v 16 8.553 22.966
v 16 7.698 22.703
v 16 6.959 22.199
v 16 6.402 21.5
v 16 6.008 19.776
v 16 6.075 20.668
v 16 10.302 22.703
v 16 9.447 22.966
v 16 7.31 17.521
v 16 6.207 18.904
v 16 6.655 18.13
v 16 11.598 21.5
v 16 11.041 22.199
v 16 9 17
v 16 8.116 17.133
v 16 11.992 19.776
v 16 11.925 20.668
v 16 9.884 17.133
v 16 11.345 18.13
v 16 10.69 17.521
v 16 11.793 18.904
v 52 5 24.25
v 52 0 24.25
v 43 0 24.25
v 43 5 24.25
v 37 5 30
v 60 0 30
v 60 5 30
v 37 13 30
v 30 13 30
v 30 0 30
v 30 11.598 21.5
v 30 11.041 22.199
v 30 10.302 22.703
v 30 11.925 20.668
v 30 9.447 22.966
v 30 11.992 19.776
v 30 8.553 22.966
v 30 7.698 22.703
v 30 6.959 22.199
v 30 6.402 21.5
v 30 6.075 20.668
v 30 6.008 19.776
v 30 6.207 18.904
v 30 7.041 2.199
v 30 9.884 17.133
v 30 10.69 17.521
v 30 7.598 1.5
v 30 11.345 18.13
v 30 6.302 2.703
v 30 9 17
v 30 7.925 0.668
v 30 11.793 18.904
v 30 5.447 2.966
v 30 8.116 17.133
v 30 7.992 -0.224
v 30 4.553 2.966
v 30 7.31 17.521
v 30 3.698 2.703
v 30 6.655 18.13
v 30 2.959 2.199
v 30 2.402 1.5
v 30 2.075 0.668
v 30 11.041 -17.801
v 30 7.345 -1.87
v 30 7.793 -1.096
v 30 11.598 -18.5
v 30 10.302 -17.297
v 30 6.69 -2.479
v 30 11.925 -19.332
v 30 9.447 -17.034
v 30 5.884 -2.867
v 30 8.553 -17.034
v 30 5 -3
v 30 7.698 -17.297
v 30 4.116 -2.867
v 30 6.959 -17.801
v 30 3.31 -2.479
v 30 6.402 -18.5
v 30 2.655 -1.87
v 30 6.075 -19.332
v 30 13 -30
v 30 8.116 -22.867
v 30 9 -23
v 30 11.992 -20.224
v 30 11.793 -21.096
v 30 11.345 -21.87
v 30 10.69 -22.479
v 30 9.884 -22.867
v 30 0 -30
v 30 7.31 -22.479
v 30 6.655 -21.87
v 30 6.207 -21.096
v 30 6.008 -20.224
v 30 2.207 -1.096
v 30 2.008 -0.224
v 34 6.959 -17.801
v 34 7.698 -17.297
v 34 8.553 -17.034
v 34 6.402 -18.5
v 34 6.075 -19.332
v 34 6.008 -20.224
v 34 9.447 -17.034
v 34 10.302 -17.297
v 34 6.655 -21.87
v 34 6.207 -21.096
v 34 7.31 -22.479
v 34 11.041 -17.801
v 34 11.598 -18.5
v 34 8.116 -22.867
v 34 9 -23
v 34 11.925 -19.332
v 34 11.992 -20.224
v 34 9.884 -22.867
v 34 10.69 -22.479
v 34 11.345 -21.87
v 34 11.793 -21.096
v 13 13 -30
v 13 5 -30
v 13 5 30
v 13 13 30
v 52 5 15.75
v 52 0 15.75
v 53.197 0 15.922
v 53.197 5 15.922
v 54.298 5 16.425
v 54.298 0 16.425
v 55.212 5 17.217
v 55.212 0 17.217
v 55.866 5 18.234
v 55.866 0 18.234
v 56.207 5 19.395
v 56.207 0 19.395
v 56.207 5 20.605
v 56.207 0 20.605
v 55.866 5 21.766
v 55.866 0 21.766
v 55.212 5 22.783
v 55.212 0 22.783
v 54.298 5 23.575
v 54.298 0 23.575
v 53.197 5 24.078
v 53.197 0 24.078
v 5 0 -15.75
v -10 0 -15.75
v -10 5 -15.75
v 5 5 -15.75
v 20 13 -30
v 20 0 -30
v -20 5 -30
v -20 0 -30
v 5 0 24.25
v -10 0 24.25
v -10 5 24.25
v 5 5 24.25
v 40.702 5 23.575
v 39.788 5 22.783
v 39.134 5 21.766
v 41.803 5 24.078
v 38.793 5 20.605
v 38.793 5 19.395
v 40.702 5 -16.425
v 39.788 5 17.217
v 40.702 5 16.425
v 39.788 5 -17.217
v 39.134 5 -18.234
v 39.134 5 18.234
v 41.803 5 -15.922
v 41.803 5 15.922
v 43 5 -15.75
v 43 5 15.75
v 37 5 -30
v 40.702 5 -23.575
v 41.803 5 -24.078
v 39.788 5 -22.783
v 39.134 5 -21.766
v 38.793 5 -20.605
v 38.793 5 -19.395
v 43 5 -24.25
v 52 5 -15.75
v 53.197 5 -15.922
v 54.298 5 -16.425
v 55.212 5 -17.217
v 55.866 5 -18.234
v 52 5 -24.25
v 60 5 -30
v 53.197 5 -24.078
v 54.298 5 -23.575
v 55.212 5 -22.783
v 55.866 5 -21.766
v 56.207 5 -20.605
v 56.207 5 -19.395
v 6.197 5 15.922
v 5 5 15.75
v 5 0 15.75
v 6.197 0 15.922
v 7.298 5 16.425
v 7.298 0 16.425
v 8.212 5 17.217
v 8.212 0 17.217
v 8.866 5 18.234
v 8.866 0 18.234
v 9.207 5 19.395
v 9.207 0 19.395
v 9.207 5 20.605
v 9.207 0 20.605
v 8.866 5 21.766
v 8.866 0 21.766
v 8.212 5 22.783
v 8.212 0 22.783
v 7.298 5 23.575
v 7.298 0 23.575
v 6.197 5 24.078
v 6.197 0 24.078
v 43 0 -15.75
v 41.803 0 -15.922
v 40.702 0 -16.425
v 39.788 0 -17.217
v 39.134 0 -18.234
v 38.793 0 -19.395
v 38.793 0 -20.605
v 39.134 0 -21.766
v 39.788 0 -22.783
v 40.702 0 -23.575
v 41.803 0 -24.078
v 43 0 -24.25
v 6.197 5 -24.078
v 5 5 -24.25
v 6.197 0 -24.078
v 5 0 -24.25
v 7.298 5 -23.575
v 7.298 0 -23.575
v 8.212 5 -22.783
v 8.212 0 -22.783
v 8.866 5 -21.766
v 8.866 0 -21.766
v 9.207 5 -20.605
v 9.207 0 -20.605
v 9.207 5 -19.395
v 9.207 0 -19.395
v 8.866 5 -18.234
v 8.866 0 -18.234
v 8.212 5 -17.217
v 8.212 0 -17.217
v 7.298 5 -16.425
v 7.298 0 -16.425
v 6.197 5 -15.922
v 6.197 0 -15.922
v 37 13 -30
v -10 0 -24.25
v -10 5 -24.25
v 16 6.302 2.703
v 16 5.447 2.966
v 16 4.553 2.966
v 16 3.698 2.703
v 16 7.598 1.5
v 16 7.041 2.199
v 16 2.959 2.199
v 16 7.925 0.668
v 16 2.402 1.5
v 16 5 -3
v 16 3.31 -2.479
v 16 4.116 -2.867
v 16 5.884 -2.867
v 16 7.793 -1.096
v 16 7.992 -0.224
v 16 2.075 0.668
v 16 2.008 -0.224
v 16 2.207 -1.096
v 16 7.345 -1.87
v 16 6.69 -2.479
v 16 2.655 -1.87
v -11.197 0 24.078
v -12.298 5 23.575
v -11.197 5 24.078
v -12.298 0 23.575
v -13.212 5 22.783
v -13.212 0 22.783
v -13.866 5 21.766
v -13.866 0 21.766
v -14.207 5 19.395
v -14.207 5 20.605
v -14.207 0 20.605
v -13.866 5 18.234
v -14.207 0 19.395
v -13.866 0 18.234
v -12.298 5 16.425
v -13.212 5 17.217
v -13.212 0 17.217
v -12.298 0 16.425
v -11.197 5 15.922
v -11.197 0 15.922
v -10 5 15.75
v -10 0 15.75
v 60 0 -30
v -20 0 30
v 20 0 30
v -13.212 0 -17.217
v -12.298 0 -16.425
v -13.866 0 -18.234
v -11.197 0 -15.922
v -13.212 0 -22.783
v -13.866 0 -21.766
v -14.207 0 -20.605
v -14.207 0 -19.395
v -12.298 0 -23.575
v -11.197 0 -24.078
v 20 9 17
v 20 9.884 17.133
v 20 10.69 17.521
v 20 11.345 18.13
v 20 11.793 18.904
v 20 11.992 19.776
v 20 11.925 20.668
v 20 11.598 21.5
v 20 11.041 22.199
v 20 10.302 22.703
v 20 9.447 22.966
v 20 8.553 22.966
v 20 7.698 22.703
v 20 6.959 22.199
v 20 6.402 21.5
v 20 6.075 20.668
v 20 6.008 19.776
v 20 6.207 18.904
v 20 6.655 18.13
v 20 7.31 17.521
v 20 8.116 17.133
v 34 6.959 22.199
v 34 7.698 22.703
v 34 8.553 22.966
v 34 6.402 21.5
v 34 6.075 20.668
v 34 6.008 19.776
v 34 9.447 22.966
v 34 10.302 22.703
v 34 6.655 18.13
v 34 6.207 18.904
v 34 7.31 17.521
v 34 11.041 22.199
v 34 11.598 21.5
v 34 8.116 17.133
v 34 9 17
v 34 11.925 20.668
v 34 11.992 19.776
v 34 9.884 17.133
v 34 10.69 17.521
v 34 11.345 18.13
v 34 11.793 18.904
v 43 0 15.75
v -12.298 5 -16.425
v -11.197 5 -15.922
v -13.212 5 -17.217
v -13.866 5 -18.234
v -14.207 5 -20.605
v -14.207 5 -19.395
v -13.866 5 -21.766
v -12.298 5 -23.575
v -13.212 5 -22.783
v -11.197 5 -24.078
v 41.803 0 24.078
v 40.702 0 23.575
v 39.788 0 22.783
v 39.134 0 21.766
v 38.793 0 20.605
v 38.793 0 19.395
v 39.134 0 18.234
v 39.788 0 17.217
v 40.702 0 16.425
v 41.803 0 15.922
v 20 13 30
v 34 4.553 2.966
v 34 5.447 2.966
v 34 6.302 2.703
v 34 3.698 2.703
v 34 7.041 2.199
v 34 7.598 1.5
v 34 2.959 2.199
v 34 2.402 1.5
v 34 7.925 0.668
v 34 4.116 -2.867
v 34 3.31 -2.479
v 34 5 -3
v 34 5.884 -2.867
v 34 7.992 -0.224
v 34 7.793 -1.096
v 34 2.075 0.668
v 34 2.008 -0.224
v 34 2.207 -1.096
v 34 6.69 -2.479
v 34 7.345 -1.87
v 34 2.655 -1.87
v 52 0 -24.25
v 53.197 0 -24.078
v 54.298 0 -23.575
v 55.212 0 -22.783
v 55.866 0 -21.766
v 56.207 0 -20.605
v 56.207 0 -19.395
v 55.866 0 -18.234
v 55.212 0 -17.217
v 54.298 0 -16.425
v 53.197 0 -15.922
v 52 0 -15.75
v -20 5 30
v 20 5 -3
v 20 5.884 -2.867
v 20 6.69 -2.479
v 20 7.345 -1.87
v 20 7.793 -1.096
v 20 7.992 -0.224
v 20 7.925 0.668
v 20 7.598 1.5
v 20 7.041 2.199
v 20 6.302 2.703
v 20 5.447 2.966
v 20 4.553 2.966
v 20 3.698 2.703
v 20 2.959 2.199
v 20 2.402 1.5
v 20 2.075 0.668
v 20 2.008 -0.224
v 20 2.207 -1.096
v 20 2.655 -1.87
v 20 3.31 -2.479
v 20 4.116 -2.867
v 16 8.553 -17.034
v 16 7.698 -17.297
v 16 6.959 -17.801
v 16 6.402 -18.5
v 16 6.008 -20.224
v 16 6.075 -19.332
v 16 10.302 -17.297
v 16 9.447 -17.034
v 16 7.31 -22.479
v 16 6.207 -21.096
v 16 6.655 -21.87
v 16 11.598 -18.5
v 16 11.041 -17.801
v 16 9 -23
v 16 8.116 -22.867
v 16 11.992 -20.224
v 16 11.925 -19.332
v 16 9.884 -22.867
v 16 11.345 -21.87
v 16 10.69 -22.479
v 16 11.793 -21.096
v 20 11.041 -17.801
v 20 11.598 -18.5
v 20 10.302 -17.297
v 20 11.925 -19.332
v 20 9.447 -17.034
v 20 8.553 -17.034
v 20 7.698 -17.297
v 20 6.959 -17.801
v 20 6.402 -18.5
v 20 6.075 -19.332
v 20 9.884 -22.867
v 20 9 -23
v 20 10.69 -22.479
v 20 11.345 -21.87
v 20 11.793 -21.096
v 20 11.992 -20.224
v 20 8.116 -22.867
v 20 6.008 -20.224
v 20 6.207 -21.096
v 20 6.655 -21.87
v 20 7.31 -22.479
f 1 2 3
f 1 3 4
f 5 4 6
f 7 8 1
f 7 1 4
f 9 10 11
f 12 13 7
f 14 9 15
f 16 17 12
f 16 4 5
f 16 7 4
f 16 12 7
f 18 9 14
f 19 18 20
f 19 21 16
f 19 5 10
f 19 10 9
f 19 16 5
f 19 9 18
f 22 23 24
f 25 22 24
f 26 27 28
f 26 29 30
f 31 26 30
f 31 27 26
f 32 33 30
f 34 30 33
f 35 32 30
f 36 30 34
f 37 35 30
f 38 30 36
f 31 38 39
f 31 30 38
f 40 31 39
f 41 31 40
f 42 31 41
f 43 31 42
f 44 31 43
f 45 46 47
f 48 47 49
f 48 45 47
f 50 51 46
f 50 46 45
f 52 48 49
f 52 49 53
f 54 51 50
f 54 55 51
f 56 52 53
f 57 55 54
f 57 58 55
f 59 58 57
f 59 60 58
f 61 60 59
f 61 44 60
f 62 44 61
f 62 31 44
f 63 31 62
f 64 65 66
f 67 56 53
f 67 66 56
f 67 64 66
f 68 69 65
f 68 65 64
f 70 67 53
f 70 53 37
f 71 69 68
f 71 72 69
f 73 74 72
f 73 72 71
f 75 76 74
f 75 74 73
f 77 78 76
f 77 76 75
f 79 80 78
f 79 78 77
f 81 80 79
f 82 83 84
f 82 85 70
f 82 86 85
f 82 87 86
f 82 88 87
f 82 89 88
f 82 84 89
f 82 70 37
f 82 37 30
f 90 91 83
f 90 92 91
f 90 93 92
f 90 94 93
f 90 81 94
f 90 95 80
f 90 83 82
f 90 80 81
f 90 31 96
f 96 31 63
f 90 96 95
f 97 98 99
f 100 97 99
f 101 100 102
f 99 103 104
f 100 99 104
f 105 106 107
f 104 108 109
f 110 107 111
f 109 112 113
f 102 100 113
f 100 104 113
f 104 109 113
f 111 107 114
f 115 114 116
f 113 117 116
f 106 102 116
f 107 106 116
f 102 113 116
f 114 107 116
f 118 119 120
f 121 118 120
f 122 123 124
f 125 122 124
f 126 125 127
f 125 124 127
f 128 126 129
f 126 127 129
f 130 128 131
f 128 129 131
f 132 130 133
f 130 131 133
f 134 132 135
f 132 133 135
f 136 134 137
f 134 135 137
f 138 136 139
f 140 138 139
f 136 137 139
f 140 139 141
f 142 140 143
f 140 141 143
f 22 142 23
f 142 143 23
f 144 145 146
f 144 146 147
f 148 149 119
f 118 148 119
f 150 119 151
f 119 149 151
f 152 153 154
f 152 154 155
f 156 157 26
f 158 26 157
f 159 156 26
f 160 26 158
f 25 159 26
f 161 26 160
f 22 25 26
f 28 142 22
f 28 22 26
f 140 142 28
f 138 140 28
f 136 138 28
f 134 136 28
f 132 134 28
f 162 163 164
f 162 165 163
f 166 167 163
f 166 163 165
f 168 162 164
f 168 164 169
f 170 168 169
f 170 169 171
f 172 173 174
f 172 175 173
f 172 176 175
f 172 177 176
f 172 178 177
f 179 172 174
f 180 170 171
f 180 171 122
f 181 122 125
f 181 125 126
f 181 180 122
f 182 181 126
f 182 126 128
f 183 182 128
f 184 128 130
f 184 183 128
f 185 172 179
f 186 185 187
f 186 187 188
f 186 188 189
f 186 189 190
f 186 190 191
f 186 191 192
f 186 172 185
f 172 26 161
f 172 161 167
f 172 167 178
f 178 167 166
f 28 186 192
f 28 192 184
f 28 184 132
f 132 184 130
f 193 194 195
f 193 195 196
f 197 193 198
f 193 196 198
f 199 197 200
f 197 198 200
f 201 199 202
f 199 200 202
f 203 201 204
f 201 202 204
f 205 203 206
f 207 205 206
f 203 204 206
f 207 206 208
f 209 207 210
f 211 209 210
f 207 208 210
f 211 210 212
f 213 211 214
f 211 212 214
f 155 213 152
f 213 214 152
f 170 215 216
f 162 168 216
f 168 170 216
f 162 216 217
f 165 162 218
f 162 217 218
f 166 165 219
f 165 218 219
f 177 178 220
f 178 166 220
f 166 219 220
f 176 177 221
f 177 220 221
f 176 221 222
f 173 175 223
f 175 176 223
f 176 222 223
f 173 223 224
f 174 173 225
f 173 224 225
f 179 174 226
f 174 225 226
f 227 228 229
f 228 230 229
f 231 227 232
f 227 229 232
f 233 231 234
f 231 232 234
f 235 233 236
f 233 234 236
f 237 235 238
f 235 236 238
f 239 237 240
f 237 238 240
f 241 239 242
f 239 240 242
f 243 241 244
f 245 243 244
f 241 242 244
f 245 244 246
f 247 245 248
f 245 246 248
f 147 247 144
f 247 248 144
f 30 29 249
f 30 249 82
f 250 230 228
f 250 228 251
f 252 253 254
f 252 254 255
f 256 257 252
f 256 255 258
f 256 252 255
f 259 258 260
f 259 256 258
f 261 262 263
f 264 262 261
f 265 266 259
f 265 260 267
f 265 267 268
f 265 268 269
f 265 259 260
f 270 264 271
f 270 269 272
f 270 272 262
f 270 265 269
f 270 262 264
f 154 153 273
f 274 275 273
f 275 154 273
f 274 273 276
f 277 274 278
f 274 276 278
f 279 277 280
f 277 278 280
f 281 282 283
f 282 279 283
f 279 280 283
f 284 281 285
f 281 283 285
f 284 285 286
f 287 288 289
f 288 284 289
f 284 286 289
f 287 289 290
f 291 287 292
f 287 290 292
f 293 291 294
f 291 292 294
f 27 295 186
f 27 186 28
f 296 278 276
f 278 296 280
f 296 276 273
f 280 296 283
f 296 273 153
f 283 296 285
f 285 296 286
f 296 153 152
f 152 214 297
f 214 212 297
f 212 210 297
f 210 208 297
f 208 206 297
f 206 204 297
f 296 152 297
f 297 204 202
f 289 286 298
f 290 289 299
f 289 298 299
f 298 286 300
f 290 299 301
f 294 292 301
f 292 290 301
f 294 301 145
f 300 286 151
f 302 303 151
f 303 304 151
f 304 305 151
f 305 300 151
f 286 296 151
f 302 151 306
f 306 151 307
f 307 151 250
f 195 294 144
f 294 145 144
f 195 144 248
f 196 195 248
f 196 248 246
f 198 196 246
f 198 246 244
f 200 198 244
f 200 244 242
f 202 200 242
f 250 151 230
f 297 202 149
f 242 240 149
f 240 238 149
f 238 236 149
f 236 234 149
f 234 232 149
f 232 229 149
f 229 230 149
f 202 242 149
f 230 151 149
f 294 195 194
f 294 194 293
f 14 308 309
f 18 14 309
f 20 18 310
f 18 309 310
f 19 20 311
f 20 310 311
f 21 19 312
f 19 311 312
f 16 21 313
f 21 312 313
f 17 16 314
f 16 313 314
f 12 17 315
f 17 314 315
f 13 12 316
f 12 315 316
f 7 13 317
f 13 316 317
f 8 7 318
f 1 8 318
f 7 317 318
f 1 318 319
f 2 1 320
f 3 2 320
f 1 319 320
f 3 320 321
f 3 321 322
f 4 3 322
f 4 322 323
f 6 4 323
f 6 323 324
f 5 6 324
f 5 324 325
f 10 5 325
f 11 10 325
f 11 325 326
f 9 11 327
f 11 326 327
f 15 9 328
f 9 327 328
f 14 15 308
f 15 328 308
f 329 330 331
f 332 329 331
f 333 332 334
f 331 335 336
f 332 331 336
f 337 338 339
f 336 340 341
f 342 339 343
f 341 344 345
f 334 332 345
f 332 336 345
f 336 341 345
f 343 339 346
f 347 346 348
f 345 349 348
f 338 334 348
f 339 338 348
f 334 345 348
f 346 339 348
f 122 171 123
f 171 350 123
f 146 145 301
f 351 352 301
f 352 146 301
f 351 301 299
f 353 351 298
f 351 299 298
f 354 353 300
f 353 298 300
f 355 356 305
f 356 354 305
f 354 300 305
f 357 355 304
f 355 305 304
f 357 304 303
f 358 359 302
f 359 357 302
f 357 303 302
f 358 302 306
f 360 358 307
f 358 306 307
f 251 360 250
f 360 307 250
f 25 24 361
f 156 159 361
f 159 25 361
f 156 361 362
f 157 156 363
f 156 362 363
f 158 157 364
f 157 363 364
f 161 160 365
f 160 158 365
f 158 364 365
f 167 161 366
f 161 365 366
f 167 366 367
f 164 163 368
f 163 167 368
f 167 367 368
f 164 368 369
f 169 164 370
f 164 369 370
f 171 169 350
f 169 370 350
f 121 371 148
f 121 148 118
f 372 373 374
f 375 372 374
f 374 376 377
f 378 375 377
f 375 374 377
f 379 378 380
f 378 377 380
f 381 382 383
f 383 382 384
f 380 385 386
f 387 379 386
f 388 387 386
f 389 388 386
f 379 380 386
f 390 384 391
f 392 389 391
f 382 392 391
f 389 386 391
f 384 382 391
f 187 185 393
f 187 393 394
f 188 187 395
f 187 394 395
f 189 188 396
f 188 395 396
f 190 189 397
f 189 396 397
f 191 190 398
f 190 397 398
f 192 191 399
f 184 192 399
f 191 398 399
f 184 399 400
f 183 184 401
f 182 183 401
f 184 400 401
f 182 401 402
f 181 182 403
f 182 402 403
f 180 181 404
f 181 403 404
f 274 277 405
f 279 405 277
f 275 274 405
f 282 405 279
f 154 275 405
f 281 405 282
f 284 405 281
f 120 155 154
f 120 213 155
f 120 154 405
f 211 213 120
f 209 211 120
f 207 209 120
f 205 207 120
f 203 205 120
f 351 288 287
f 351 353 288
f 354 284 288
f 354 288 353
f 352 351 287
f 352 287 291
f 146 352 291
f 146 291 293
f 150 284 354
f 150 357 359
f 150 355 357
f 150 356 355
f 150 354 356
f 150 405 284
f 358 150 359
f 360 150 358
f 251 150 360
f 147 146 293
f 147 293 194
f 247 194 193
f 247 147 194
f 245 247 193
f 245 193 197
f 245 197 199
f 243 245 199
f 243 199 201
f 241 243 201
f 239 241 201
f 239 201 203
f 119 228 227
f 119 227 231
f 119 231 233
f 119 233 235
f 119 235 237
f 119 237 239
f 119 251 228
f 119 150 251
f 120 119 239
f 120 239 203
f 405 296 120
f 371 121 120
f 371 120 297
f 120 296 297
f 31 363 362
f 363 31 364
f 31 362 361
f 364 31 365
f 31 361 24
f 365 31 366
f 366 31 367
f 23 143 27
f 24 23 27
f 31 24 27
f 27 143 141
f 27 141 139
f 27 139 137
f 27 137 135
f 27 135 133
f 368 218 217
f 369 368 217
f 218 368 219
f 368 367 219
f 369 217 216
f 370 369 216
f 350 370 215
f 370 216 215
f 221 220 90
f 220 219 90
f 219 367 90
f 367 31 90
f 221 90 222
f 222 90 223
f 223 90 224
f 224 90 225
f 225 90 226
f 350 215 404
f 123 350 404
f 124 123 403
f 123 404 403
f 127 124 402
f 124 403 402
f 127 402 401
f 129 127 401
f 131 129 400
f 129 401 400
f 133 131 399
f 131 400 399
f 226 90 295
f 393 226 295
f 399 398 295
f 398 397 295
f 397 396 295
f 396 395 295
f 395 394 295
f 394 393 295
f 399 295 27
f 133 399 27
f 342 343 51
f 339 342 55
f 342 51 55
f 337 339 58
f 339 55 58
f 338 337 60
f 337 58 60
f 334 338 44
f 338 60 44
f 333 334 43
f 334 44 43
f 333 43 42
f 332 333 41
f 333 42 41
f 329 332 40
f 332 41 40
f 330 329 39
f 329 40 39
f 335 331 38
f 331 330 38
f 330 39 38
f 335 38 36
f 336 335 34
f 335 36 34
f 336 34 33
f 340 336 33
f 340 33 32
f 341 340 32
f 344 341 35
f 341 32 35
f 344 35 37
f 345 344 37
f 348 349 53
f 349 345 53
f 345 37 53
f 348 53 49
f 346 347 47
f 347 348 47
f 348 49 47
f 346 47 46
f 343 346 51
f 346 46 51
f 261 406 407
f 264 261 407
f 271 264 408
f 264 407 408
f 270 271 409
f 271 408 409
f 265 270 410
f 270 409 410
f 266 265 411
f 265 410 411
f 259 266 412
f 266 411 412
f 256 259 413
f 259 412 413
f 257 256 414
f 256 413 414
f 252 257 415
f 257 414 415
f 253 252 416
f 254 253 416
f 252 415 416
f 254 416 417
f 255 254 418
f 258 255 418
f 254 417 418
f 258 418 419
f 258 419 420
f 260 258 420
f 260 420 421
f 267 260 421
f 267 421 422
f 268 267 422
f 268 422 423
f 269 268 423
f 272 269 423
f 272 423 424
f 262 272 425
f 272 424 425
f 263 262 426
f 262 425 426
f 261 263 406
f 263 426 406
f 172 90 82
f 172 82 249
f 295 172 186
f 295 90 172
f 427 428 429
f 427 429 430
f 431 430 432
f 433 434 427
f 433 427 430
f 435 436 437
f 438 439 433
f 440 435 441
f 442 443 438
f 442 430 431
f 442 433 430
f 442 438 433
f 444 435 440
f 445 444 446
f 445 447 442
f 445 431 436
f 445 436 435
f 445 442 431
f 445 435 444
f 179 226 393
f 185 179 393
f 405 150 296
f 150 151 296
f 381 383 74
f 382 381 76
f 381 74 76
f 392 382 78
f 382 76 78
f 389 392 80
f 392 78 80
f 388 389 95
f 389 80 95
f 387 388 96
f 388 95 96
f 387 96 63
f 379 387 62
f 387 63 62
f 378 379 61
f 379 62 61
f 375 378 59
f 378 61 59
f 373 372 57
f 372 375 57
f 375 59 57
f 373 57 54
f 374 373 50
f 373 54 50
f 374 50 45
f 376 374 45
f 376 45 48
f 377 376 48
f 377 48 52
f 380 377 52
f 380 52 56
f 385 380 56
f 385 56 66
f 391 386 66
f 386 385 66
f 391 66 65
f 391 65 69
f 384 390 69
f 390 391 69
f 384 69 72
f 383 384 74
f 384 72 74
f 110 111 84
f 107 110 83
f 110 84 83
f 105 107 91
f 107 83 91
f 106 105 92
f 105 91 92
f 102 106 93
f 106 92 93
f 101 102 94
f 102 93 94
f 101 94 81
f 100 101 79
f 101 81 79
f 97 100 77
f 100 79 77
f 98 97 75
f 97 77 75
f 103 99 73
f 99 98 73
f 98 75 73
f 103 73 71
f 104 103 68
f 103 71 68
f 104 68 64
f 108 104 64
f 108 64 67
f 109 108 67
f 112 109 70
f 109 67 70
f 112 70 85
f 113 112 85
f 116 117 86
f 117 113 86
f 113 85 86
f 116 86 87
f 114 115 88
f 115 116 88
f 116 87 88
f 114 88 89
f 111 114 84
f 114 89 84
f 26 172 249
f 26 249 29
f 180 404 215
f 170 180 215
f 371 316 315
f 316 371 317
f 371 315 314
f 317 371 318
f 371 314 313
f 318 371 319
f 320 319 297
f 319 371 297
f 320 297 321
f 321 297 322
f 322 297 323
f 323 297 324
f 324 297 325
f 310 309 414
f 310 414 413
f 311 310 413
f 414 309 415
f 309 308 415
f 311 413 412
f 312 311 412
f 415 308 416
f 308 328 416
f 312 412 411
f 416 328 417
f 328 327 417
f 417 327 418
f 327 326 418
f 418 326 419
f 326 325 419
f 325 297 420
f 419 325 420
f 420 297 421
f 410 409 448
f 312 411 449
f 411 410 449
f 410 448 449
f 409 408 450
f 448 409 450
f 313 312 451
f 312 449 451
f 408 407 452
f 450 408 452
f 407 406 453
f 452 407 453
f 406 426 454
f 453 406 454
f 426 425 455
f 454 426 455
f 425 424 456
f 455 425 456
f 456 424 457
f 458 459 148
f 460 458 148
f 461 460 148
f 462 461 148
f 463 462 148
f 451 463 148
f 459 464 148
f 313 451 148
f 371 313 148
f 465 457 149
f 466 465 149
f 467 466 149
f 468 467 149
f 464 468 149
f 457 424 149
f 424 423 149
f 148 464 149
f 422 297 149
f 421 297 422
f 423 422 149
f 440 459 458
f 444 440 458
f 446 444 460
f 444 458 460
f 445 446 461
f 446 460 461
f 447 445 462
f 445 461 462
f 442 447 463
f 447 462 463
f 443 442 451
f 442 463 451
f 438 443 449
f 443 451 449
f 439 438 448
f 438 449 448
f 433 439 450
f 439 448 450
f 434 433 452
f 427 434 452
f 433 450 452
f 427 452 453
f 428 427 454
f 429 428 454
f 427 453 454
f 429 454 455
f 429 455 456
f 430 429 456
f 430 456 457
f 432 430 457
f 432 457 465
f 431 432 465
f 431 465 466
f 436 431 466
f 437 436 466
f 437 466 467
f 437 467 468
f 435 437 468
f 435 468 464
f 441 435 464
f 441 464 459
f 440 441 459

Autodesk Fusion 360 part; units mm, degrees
sketch "Sketch1" plane through (0, 0, 0) normal (0, 1, 0) x (1, 0, 0)
  line L0 (20, 30) -> (-20, 30)
  line L1 (-20, 30) -> (-20, -30)
  line L2 (-20, -30) -> (20, -30)
  line L3 (20, -30) -> (20, 30)
  line L4 (20, 30) -> (-20, -30) construction
  line L5 (-20, 30) -> (20, -30) construction
  circle A0 centre (-10, 20) radius 4.25
  circle A1 centre (5, 20) radius 4.25
  circle A2 centre (-10, -20) radius 4.25
  circle A3 centre (5, -20) radius 4.25
  line L6 (-10, 15.75) -> (5, 15.75)
  line L7 (5, 15.75) -> (5, 24.25)
  line L8 (5, 24.25) -> (-10, 24.25)
  line L9 (-10, 24.25) -> (-10, 15.75)
  line L10 (-10, -24.25) -> (5, -24.25)
  line L11 (5, -24.25) -> (5, -15.75)
  line L12 (5, -15.75) -> (-10, -15.75)
  line L13 (-10, -15.75) -> (-10, -24.25)
  dimension "d1" = 40
  dimension "d2" = 60
  dimension "d3" = 8.5
  dimension "d4" = 8.5
  dimension "d5" = 8.5
  dimension "d6" = 8.5
extrude "Extrude1" add sketch "Sketch1" along normal blind 5 makes body 1
sketch "Sketch2" plane through (0, 5, 0) normal (0, 1, 0) x (-1, 0, 0)
  line L0 (10, 15.75) -> (-5, 15.75)
  arc A0 (-5, 24.25) -> (-5, 15.75) centre (-5, 20) ccw
  line L1 (-5, 24.25) -> (10, 24.25)
  arc A1 (10, 15.75) -> (10, 24.25) centre (10, 20) ccw
  line L2 (10, -24.25) -> (-5, -24.25)
  arc A2 (-5, -15.75) -> (-5, -24.25) centre (-5, -20) ccw
  line L3 (-5, -15.75) -> (10, -15.75)
  arc A3 (10, -24.25) -> (10, -15.75) centre (10, -20) ccw
  line L4 (-20, 30) -> (-20, -30)
  line L5 (-20, -30) -> (20, -30)
  line L6 (20, -30) -> (20, 30)
  line L7 (20, 30) -> (-20, 30)
  line L8 (-20, -30) -> (-13, -30)
  line L9 (-13, -30) -> (-13, 30)
  line L10 (-13, 30) -> (-20, 30)
  line L11 (-20, 30) -> (-20, -30)
  dimension "d9" = 7
extrude "Extrude2" add sketch "Sketch2" along normal blind 8 contours L4 L5 L7 L8 L9 L10 L11 bodies 1
sketch "Sketch3" plane through (20, 0, 0) normal (1, 0, 0) x (0, 0, -1)
  line L0 (-30, 0) -> (30, 0)
  line L1 (30, 0) -> (30, 13)
  line L2 (30, 13) -> (-30, 13)
  line L3 (-30, 13) -> (-30, 0)
  circle A0 centre (-20, 9) radius 3
  circle A1 centre (0, 5) radius 3
  circle A2 centre (20, 9) radius 3
  dimension "d22" = 6
  dimension "d23" = 6
  dimension "d24" = 6
extrude "Extrude3" cut sketch "Sketch3" against normal blind 4 contours A0 | A1 | A2 bodies 1
sketch "Sketch4" plane through (0, 0, 0) normal (0, 1, 0) x (1, 0, 0)
  line L0 (30, 30) -> (60, 30)
  line L1 (60, 30) -> (60, -30)
  line L2 (60, -30) -> (30, -30)
  line L3 (30, -30) -> (30, 30)
  circle A0 centre (43, 20) radius 4.25
  circle A1 centre (43, -20) radius 4.25
  circle A2 centre (52, -20) radius 4.25
  circle A3 centre (52, 20) radius 4.25
  line L4 (43, 24.25) -> (52, 24.25)
  line L5 (52, 24.25) -> (52, 15.75)
  line L6 (52, 15.75) -> (43, 15.75)
  line L7 (43, 15.75) -> (43, 24.25)
  line L8 (43, -15.75) -> (52, -15.75)
  line L9 (52, -15.75) -> (52, -24.25)
  line L10 (52, -24.25) -> (43, -24.25)
  line L11 (43, -24.25) -> (43, -15.75)
  dimension "d18" = 8.5
  dimension "d19" = 8.5
  dimension "d29" = 8.5
  dimension "d30" = 8.5
extrude "Extrude4" add sketch "Sketch4" along normal blind 5 separate body makes body 2
sketch "Sketch5" plane through (0, 5, 0) normal (0, 1, 0) x (-1, 0, 0)
  line L0 (-30, 30) -> (-60, 30)
  line L1 (-60, 30) -> (-60, -30)
  line L2 (-60, -30) -> (-30, -30)
  line L3 (-30, -30) -> (-30, 30)
  line L4 (-30, -30) -> (-37, -30)
  line L5 (-37, -30) -> (-37, 30)
  line L6 (-37, 30) -> (-30, 30)
  line L7 (-30, 30) -> (-30, -30)
  arc A0 (-43, -24.25) -> (-43, -15.75) centre (-43, -20) ccw
  line L8 (-43, -24.25) -> (-52, -24.25)
  arc A1 (-52, -15.75) -> (-52, -24.25) centre (-52, -20) ccw
  line L9 (-52, -15.75) -> (-43, -15.75)
  arc A2 (-43, 15.75) -> (-43, 24.25) centre (-43, 20) ccw
  line L10 (-43, 15.75) -> (-52, 15.75)
  arc A3 (-52, 24.25) -> (-52, 15.75) centre (-52, 20) ccw
  line L11 (-52, 24.25) -> (-43, 24.25)
extrude "Extrude5" add sketch "Sketch5" along normal blind 8 contours L0 L2 L3 L4 L5 L6 L7 bodies 2
extrude "Extrude6" cut sketch "Sketch3" along normal blind 14 contours A0 | A1 | A2 bodies 2
